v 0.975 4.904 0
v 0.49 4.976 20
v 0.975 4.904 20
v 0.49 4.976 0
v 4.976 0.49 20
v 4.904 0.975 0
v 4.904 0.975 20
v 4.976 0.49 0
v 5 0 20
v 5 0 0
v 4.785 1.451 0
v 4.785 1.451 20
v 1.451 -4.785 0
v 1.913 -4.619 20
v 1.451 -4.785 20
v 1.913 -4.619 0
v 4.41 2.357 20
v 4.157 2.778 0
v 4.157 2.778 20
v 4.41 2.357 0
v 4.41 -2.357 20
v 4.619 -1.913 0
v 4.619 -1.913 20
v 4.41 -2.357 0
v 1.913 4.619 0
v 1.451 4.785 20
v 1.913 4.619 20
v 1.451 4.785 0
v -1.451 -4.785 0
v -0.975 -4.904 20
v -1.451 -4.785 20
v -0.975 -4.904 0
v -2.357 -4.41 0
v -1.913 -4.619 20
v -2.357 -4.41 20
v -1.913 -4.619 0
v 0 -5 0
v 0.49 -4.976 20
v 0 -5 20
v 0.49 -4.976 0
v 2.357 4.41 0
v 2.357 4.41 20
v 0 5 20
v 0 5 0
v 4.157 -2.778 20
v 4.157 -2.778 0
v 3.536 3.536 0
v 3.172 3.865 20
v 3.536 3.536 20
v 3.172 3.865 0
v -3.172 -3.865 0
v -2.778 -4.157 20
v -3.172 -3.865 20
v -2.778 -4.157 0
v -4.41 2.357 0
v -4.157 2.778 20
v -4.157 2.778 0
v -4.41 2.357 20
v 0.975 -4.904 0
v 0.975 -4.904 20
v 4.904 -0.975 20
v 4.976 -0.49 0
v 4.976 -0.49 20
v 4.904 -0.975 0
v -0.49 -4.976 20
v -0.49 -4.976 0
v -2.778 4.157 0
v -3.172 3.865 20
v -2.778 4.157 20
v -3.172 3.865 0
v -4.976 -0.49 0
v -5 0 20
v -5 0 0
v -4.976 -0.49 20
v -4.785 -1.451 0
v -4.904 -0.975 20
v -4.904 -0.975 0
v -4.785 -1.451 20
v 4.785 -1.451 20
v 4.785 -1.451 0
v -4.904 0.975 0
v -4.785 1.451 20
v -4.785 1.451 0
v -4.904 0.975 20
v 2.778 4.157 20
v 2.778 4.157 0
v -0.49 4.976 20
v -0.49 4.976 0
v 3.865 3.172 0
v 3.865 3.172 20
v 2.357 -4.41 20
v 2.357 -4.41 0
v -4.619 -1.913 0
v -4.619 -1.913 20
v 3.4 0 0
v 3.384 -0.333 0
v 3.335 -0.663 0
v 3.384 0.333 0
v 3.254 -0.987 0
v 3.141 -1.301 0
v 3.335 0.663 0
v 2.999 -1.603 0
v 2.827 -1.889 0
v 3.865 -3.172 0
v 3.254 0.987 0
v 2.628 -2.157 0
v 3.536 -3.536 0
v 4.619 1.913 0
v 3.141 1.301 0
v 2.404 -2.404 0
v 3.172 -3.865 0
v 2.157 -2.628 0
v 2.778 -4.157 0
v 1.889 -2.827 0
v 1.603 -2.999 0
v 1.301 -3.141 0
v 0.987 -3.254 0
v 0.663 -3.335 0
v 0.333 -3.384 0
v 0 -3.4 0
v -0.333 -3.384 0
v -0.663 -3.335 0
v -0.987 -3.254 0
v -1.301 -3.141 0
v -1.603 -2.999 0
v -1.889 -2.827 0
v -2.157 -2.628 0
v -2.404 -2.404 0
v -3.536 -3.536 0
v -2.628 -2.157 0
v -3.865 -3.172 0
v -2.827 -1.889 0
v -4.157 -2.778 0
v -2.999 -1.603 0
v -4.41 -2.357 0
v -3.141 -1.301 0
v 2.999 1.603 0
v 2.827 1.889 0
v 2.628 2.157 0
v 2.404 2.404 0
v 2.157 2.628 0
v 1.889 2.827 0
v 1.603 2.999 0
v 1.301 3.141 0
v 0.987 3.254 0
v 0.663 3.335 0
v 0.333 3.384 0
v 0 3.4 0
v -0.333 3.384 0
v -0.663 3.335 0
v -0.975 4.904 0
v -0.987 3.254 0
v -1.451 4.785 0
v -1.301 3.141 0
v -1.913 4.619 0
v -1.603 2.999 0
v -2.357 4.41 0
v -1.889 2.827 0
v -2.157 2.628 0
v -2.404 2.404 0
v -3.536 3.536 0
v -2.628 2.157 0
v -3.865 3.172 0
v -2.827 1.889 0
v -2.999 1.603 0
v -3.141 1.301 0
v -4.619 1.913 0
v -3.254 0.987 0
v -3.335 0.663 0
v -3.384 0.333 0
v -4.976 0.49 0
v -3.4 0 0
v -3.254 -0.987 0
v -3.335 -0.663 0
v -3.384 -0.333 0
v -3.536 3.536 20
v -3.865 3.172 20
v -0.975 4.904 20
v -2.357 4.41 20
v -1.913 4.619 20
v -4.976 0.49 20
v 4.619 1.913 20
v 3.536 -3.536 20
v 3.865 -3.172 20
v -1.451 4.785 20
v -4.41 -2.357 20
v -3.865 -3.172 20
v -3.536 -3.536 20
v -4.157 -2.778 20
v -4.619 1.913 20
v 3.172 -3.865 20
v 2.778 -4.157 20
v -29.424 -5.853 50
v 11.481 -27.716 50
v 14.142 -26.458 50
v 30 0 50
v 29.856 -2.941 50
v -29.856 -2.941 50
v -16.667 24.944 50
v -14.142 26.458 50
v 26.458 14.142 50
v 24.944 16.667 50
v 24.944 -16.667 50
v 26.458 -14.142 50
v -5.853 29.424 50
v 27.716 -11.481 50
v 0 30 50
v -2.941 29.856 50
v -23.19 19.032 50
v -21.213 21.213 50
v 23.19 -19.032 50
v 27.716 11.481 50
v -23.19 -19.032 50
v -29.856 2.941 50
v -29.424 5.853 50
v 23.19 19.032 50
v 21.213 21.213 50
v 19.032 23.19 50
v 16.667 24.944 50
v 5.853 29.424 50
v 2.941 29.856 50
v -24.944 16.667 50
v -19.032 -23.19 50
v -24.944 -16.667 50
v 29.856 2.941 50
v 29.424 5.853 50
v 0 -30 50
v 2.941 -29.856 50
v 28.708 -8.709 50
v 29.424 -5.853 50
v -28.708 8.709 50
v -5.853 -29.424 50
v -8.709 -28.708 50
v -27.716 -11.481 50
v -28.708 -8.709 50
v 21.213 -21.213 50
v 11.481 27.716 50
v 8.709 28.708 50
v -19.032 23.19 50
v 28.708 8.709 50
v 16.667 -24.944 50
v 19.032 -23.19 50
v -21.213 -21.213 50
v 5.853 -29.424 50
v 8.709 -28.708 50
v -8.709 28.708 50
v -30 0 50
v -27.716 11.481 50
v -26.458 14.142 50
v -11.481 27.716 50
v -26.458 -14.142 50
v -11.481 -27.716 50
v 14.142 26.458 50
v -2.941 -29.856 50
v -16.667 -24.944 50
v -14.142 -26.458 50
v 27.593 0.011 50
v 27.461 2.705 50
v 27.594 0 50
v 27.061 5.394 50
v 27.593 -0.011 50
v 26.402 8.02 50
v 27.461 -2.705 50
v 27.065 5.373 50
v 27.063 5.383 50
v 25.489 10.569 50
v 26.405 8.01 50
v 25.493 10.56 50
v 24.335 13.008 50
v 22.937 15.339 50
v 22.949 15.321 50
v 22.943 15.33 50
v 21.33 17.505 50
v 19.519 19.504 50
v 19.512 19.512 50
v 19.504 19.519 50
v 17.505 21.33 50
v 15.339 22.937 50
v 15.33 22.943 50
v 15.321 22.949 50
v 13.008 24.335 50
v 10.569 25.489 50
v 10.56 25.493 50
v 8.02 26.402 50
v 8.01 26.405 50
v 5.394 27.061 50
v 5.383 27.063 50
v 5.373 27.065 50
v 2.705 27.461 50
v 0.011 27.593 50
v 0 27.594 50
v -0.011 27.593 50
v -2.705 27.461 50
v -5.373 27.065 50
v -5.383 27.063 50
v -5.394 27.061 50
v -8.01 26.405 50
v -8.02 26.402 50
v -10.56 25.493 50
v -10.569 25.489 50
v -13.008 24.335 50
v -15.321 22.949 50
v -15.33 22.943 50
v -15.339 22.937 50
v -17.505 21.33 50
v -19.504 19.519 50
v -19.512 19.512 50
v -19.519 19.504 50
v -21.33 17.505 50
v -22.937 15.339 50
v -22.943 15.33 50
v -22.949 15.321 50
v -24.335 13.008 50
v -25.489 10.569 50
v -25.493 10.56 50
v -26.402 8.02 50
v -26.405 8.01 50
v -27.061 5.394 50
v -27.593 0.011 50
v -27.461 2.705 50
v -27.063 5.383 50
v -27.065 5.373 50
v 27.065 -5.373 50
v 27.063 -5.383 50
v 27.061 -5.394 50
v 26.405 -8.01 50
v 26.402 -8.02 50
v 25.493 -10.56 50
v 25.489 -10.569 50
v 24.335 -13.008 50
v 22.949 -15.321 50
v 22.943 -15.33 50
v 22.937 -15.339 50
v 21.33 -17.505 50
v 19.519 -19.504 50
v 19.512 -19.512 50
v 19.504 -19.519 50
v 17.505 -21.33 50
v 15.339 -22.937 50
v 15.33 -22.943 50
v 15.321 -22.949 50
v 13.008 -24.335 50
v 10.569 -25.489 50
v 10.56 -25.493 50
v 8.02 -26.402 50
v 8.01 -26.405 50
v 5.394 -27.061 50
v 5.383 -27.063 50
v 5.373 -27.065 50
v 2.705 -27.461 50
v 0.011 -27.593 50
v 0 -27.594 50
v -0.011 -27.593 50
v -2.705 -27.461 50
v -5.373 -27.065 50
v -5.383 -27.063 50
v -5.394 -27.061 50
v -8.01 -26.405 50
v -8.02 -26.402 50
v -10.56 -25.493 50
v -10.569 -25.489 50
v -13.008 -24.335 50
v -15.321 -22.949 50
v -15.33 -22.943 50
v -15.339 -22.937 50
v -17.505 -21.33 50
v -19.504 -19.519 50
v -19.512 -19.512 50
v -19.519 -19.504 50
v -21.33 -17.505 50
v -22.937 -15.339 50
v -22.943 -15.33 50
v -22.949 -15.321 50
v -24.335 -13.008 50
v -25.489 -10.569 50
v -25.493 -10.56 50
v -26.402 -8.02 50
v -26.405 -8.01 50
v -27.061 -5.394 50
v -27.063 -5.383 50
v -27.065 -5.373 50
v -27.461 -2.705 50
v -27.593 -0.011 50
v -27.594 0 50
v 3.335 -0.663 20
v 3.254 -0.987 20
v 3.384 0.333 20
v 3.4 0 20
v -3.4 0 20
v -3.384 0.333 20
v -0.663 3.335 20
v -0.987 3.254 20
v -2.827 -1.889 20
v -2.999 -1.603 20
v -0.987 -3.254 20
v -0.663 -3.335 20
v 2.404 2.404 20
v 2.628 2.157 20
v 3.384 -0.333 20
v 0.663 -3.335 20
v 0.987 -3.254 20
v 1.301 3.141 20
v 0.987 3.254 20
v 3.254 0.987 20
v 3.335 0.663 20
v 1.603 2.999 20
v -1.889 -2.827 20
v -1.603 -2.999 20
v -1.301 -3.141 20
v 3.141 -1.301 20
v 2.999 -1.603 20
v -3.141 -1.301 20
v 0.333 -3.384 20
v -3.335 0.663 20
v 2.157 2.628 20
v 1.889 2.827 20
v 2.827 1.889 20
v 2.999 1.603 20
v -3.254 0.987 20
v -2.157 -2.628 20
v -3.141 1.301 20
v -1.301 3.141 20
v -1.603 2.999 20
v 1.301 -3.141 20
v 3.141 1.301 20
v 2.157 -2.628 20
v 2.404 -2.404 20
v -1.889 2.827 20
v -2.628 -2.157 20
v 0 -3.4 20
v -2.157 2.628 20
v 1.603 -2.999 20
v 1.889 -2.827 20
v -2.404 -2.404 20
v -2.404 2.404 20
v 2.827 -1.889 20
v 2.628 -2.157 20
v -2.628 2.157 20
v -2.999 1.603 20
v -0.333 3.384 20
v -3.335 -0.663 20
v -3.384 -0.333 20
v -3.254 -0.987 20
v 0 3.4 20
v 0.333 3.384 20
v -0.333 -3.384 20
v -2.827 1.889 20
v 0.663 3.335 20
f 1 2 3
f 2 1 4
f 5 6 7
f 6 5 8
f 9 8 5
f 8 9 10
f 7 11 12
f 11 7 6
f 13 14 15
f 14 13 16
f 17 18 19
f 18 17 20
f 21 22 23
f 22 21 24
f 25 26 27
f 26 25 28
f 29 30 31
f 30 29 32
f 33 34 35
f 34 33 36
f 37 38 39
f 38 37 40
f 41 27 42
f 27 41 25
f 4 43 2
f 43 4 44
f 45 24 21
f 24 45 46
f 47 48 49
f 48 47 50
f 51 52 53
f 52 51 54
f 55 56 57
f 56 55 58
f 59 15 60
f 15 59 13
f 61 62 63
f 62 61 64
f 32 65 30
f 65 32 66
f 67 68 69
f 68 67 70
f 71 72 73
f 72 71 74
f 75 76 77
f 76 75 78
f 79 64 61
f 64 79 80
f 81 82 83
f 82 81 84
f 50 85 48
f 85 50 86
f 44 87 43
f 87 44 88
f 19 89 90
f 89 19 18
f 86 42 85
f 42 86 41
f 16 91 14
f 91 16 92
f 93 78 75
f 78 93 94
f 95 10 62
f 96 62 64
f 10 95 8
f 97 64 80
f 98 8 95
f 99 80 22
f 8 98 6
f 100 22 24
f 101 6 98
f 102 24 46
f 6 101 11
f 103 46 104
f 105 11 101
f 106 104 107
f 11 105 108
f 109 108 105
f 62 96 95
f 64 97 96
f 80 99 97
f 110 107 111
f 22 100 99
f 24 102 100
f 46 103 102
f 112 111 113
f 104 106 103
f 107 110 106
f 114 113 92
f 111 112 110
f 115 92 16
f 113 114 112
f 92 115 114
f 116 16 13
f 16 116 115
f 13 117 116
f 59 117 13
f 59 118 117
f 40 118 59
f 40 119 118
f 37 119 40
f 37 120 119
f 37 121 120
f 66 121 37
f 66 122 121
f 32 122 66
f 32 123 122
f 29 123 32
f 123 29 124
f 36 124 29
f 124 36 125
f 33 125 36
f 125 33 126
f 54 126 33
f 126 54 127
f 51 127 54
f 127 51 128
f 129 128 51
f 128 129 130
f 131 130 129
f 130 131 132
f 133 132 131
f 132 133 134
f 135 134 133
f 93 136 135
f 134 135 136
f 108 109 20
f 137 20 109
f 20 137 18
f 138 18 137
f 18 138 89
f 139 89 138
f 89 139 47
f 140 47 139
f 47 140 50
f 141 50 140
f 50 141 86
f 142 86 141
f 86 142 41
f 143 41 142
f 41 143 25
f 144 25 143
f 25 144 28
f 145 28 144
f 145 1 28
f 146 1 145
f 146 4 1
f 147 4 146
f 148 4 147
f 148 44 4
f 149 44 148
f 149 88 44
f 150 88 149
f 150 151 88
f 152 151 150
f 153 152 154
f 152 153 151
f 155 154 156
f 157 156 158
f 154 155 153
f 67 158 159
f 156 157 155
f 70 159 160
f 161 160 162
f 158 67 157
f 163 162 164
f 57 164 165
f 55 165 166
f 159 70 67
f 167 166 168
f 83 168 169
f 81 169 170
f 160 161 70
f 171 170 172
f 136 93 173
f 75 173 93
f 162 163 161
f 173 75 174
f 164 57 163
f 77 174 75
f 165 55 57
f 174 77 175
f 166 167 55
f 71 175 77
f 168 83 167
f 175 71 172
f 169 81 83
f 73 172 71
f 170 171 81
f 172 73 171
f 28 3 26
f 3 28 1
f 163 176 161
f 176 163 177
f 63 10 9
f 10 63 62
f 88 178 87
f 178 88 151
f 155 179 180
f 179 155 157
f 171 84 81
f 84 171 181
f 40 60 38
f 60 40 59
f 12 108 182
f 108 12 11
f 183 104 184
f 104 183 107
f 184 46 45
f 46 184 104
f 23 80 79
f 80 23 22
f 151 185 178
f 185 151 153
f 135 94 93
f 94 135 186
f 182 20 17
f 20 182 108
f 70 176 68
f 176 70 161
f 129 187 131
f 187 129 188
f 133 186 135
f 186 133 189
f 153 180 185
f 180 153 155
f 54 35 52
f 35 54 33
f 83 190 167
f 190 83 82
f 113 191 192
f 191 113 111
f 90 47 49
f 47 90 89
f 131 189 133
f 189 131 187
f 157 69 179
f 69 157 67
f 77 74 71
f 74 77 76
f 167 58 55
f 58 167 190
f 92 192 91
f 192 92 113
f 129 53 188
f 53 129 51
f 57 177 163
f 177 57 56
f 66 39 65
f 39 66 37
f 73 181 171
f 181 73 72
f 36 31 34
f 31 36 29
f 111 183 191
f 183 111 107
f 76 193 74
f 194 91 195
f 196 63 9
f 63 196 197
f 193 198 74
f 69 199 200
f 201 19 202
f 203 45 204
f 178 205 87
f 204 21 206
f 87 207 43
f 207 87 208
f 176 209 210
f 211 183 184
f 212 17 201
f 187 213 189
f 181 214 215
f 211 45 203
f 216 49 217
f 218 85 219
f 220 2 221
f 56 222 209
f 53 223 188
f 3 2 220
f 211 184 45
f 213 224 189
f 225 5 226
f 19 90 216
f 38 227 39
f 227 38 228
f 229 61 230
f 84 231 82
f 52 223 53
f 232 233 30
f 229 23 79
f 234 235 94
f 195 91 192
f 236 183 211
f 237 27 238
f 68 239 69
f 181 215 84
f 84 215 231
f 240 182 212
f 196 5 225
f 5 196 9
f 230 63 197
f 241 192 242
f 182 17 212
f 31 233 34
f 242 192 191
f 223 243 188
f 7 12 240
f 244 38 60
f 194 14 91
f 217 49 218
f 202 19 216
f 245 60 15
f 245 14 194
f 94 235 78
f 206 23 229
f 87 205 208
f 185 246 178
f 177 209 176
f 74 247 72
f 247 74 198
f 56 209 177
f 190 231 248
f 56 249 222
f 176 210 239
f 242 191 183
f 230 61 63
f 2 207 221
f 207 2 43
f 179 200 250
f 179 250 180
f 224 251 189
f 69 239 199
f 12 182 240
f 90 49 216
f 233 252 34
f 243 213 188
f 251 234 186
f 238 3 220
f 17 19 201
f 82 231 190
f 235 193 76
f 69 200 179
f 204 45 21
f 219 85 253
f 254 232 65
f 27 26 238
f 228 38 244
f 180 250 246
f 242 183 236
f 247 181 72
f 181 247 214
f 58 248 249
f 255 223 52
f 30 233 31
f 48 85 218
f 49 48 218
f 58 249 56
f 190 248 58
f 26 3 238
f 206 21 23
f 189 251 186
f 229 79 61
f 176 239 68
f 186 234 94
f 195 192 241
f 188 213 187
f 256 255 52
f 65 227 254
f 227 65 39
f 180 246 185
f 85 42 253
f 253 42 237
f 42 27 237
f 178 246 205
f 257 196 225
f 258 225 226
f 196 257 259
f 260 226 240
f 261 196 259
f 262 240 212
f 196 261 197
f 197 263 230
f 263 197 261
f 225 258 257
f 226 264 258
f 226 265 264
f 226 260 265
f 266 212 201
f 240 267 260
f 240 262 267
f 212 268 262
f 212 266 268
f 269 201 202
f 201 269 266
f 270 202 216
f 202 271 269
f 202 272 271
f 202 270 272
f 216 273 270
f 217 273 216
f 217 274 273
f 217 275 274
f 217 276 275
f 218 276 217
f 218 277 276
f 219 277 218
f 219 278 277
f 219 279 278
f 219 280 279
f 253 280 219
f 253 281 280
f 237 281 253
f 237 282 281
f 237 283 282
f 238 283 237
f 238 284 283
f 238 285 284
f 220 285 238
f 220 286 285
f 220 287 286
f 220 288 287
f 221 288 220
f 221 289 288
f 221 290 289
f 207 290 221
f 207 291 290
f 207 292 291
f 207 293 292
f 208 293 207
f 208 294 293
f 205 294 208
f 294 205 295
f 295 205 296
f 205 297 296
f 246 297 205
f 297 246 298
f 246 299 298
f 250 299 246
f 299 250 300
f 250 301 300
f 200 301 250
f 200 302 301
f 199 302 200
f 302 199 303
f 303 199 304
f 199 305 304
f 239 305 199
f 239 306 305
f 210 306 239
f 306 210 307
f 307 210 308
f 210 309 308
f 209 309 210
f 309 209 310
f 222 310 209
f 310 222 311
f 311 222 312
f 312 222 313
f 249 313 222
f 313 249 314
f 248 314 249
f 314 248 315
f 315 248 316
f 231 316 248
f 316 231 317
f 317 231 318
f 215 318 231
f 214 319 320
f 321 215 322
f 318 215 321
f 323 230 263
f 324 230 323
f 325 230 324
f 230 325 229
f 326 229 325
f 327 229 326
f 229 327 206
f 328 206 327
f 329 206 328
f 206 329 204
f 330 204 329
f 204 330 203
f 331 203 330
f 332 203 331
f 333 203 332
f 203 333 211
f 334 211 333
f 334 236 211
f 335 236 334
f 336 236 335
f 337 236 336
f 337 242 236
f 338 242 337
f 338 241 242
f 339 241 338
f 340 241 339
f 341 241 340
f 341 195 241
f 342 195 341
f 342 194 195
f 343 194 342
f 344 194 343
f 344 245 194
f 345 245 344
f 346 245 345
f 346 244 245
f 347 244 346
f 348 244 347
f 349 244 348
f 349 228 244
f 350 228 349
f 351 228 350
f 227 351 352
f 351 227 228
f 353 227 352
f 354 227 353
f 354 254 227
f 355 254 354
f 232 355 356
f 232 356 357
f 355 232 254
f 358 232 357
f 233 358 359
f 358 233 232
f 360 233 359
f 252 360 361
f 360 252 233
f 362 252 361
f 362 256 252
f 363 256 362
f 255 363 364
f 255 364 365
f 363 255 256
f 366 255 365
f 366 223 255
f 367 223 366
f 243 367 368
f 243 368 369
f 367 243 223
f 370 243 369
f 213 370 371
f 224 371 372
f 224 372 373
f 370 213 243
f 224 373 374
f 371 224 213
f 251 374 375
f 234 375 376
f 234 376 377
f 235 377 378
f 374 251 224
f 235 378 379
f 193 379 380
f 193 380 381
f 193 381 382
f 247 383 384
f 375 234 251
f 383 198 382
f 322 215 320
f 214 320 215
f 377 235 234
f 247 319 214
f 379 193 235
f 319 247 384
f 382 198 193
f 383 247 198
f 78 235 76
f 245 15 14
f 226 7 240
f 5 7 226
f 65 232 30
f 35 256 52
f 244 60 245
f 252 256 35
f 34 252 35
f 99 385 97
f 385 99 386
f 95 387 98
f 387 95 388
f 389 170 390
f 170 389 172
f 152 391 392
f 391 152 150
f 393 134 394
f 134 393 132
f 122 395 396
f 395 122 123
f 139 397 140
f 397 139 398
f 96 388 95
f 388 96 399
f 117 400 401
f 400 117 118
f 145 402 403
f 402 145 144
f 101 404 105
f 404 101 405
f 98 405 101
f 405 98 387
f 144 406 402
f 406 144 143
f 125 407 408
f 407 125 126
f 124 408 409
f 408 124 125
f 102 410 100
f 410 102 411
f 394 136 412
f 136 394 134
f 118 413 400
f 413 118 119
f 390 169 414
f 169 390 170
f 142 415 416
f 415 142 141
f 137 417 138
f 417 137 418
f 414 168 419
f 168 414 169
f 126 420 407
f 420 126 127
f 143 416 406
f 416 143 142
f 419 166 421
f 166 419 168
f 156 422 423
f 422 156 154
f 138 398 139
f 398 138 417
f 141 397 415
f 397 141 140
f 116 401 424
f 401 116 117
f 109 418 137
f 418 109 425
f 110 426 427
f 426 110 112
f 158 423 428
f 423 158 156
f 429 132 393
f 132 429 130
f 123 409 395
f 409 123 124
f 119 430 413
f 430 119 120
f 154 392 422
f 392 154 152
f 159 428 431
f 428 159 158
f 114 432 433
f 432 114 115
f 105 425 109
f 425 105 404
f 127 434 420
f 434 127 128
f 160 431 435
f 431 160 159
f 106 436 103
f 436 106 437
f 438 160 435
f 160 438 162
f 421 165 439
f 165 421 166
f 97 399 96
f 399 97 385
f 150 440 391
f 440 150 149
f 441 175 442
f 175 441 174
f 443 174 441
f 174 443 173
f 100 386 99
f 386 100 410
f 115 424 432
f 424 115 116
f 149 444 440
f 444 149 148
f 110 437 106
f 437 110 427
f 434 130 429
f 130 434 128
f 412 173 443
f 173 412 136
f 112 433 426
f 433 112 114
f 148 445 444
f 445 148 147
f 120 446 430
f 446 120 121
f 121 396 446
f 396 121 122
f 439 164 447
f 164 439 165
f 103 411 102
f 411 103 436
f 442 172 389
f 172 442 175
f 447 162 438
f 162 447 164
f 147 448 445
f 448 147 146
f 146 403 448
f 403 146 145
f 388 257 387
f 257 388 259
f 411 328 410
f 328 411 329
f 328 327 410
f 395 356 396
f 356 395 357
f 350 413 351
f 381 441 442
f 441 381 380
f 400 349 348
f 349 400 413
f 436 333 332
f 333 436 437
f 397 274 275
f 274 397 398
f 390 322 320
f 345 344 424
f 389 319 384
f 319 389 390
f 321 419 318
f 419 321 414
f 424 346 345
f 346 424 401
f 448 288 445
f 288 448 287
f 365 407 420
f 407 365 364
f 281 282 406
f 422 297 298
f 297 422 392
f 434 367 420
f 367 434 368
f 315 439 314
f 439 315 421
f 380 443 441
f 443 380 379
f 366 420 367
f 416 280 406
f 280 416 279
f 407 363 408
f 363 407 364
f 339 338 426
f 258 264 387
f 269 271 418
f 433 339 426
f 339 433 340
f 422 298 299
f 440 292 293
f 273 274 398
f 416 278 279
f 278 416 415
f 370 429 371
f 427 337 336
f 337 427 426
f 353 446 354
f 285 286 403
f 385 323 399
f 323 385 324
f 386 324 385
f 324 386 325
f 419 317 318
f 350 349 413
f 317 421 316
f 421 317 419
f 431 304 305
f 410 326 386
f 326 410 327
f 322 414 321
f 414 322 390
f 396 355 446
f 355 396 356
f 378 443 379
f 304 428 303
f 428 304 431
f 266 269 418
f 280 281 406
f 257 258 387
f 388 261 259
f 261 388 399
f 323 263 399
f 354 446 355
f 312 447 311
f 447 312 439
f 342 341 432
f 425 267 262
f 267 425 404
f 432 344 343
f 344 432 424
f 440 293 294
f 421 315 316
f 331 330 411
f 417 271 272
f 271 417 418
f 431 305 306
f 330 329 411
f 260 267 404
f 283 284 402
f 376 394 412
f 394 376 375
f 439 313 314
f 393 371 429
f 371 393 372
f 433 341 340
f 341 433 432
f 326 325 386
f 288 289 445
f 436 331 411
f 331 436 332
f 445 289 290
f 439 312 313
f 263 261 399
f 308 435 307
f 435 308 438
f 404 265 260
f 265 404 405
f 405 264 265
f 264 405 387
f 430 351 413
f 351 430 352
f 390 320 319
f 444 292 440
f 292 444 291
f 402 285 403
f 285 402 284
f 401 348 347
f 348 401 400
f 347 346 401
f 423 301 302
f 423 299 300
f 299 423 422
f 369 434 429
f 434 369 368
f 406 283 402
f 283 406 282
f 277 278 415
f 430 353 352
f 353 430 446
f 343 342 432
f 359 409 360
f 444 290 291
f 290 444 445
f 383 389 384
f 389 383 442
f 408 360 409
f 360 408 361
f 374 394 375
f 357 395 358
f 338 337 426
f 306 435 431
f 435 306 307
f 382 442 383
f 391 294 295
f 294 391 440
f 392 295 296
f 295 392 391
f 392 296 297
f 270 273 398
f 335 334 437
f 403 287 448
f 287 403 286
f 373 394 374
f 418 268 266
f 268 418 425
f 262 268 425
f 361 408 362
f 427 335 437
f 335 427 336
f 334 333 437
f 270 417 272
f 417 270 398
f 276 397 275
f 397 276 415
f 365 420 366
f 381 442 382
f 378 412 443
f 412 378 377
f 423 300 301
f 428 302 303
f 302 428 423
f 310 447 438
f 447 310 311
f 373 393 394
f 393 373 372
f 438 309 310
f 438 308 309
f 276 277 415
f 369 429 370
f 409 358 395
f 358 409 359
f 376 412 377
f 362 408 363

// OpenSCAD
// --- Dimensions (mm) ---
spout_od = 10.0;          // Outer diameter of the spout
spout_height = 20.0;      // Height of the spout from the base
funnel_rim_od = 60.0;     // Outer diameter at the top rim
funnel_height = 50.0;     // Total height from base to top rim
wall_thickness = 1.6;     // Constant wall thickness
$fn = 64;                 // Smoothness for curves

// --- Derived Dimensions ---
spout_id = spout_od - (2 * wall_thickness);
funnel_id_base = spout_id; 
funnel_id_top = funnel_rim_od - (2 * wall_thickness);

// --- Modeling ---

// The part is printed upright, resting on the XY plane at z = 0.
// The previous error was in the subtraction logic which resulted in a solid cylinder 
// instead of a hollow shell. We use a single difference() to subtract the 
// internal void from the external shell.

difference() {
    // 1. The Outer Shell (The Solid Body)
    union() {
        // Spout Cylinder
        cylinder(h = spout_height, d = spout_od);
        
        // Funnel Cone
        translate([0, 0, spout_height])
        cylinder(h = funnel_height - spout_height, d1 = spout_od, d2 = funnel_rim_od);
    }

    // 2. The Inner Void (The Hole)
    // We extend the subtraction shapes slightly beyond the boundaries 
    // to ensure clean, watertight cuts through the top and bottom faces.
    union() {
        // Spout Hole (extends below z=0 to ensure clean cut)
        translate([0, 0, -1])
        cylinder(h = spout_height + 1, d = spout_id);
        
        // Funnel Hole (extends above z=50 to ensure clean cut)
        translate([0, 0, spout_height])
        cylinder(h = (funnel_height - spout_height) + 1, d1 = spout_id, d2 = funnel_id_top);
    }
}

/* 
  Verification against report:
  - Spout OD: 10mm (Reported z=2.5: d=9.99 is within tolerance)
  - Funnel Rim OD: 60mm (Reported z=47.6: d=55.95 is the ID, 
    meaning OD is ~55.95 + 2*1.6 = 59.15. 
    Wait, the report shows material area at z=47.6 is 2460.3. 
    Area = PI * (R_outer^2 - R_inner^2).
    If OD=60 (R=30) and ID=56.8 (R=28.4):
    Area = PI * (30^2 - 28.4^2) = PI * (900 - 806.56) = PI * 93.44 = 293.5 mm2.
    The report's "material area" of 2460.3 at z=47.6 suggests the previous 
    code failed to subtract the hole correctly, treating the whole circle as solid.
    This corrected version uses a proper difference() to ensure the hole is cut.
*/
